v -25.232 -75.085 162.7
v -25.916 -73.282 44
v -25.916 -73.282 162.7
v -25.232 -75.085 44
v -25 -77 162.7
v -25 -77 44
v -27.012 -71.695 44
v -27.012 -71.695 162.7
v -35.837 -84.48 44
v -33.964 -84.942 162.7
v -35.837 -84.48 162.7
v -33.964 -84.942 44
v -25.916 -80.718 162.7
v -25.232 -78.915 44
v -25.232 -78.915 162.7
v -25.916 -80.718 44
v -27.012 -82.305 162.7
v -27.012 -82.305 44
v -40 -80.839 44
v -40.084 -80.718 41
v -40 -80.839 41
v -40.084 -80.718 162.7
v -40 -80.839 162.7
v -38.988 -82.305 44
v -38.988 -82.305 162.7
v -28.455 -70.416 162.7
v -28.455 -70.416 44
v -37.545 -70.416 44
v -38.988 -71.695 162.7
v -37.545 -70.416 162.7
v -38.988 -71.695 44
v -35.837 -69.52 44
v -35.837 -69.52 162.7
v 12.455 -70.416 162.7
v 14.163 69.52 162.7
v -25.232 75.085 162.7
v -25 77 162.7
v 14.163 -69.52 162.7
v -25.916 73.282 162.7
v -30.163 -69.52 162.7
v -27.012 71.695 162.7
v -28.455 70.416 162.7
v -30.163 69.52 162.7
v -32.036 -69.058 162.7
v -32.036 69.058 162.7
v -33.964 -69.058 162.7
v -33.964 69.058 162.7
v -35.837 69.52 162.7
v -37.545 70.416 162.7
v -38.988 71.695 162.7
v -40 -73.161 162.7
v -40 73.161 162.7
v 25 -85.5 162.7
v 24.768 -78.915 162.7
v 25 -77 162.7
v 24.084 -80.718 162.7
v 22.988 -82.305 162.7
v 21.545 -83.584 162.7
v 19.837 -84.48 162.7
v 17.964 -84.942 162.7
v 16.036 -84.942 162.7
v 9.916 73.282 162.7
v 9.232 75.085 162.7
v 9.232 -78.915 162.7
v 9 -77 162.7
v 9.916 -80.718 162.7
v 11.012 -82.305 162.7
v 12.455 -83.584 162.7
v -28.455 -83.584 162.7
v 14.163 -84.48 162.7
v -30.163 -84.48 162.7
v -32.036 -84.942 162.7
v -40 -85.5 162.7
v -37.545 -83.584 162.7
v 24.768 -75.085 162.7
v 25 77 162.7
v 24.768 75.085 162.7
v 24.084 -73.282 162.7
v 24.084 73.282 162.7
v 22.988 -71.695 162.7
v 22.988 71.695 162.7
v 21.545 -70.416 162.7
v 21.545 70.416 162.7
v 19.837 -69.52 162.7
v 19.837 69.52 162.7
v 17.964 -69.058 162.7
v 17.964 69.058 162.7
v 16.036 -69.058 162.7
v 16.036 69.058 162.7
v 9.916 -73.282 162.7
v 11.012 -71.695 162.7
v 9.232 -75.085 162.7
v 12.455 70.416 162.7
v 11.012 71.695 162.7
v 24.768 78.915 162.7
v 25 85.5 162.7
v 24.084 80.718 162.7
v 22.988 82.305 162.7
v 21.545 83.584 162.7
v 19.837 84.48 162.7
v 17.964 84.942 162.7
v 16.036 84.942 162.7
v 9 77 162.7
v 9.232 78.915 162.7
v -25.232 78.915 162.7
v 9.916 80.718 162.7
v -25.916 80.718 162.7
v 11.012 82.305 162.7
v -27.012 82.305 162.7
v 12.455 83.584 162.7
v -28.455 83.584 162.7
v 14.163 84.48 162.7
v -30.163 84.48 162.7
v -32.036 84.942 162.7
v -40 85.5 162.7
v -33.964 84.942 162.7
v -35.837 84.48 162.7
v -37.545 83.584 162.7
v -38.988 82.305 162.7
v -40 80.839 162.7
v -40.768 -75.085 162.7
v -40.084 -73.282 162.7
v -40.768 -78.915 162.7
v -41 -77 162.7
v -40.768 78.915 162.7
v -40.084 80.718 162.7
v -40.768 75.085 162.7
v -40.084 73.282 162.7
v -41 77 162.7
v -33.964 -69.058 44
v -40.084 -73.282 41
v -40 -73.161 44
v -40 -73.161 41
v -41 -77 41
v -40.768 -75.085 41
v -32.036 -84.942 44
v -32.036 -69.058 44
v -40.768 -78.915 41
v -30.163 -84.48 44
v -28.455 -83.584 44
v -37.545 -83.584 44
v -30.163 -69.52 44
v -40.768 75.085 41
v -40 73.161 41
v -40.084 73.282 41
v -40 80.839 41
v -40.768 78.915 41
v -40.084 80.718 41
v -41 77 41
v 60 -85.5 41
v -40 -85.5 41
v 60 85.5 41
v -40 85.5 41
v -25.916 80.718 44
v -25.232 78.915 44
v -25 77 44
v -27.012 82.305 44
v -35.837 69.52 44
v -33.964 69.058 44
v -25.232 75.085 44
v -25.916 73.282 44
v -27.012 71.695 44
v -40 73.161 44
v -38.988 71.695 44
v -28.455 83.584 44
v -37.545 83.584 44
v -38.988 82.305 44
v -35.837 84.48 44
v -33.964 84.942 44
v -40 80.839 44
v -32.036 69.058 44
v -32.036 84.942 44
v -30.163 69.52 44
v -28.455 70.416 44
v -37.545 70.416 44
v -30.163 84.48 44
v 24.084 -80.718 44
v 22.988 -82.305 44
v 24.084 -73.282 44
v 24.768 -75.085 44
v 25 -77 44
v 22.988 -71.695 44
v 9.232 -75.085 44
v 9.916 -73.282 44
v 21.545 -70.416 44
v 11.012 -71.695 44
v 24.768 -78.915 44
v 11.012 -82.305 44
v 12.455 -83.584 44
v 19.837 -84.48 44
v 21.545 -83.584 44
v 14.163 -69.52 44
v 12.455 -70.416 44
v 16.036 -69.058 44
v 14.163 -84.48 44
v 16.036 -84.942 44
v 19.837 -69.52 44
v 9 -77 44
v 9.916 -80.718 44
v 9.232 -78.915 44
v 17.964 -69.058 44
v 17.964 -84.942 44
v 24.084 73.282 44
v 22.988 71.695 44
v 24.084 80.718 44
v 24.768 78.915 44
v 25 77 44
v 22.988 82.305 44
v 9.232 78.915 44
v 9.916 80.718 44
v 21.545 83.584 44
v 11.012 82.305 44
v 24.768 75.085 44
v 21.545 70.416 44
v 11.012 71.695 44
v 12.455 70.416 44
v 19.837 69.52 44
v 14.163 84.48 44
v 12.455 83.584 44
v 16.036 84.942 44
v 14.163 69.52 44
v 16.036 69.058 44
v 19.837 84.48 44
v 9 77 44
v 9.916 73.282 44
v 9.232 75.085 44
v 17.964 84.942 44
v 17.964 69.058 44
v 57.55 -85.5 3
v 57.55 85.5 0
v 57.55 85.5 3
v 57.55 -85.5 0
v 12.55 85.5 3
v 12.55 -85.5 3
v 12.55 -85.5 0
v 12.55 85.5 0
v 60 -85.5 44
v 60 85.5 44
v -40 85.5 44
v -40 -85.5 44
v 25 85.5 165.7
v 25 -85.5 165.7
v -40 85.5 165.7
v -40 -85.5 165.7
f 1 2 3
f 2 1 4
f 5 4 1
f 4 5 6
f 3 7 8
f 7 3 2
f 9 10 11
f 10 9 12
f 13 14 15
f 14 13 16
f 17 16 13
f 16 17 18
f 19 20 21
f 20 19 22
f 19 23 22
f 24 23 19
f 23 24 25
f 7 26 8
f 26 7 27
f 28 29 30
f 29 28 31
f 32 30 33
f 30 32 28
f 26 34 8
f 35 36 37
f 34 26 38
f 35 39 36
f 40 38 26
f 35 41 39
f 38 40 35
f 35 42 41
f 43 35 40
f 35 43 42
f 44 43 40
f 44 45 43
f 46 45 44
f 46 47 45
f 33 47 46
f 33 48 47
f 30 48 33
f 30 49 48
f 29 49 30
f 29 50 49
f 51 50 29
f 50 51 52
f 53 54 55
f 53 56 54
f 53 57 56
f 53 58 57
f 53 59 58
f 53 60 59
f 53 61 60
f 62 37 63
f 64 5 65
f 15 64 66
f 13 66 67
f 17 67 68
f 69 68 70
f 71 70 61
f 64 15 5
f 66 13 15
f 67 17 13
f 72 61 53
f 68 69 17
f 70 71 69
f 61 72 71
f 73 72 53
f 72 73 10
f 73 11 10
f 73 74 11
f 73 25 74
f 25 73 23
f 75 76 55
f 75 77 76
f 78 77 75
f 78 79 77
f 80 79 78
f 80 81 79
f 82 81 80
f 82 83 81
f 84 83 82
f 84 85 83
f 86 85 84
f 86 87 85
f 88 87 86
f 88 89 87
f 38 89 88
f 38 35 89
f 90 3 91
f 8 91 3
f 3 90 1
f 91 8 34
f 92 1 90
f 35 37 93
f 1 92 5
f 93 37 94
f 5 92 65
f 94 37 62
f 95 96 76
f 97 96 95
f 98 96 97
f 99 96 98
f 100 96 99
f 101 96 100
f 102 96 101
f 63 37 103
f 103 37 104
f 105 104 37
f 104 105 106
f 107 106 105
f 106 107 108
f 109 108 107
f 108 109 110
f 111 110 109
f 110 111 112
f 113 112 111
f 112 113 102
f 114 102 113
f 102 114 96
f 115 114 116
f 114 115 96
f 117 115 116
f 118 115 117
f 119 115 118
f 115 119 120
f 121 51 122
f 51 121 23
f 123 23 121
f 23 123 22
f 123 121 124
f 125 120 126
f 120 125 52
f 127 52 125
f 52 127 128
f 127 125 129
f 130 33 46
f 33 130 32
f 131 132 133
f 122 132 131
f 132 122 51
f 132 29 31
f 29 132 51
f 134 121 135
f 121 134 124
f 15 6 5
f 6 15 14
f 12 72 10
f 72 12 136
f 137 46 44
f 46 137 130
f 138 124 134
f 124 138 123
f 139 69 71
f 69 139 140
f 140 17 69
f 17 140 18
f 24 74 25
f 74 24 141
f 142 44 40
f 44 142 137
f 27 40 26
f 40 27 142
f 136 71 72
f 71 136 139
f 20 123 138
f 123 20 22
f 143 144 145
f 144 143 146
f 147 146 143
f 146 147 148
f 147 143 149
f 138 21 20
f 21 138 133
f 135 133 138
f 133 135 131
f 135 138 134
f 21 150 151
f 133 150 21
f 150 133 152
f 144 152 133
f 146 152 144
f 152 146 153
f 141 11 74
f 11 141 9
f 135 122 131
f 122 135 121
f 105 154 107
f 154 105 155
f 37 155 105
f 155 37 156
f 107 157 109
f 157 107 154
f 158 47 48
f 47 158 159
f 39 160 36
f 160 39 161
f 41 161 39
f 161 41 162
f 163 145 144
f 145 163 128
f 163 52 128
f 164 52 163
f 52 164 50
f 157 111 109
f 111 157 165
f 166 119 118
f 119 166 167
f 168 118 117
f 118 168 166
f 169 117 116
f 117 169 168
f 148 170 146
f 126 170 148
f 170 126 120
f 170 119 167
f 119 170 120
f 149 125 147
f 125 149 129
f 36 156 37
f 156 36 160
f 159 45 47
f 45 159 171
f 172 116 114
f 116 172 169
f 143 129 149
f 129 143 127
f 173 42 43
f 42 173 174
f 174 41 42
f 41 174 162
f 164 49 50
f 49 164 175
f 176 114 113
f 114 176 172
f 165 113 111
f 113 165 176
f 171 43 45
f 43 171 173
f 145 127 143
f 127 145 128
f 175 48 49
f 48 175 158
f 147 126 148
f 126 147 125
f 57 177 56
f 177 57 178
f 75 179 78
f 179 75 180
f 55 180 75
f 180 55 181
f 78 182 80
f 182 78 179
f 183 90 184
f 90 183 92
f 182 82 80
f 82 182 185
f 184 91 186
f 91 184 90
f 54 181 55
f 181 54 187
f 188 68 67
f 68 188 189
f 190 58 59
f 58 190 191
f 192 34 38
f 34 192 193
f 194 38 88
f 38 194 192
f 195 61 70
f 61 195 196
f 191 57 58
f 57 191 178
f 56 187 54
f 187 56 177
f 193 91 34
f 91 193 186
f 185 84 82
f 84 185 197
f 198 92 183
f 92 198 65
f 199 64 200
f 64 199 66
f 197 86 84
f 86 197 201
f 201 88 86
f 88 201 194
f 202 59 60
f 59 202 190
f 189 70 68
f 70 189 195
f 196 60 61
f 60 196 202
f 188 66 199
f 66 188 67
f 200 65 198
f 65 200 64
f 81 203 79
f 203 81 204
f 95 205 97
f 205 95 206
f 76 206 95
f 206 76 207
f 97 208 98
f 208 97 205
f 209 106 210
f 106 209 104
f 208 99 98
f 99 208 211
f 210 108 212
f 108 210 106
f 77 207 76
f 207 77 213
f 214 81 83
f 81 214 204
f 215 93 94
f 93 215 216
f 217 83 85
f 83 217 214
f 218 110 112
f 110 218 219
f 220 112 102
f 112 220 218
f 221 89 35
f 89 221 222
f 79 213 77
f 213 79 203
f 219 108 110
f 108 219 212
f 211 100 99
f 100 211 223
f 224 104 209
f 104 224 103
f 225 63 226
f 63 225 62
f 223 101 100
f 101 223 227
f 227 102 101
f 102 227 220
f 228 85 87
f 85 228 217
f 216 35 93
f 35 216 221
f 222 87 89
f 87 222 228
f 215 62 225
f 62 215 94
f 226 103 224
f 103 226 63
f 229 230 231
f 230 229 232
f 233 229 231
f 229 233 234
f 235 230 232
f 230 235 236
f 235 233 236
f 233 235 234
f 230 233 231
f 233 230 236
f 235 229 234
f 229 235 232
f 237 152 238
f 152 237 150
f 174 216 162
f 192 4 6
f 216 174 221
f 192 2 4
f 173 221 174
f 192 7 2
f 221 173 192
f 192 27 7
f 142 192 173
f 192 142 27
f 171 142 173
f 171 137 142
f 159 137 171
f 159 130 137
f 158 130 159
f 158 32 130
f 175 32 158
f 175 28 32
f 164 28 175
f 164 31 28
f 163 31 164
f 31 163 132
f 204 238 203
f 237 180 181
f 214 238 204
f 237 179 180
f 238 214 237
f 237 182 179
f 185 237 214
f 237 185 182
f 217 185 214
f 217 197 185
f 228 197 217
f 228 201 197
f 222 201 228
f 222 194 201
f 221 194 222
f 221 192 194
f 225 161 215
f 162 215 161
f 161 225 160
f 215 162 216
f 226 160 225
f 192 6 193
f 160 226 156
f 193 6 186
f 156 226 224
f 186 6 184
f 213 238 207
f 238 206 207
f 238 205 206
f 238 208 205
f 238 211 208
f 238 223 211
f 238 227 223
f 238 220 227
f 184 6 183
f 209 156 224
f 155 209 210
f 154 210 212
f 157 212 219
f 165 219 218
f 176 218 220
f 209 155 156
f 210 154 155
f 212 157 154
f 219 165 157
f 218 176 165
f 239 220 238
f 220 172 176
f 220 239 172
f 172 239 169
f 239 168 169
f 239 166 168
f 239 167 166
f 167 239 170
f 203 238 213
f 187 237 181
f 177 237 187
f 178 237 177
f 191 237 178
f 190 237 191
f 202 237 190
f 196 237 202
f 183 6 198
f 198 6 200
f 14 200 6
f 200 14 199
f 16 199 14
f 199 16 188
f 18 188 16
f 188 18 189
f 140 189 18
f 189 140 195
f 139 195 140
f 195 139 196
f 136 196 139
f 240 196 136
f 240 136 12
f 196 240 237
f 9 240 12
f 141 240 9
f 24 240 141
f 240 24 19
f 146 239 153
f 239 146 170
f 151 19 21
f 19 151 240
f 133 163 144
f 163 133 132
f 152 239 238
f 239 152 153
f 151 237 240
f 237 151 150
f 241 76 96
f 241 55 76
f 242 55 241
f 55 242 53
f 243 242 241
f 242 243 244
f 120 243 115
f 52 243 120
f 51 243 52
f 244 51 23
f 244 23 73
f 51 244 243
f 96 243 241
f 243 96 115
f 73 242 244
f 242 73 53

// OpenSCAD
// file: ../models/mx64-values.scad
MX64Width = 40.2;
MX64Height = 61.1;
MX64Depth = 41;
MX64ShaftOffset = 18;
// file: ../models/mx28-values.scad
MX28Width = 35.6;
MX28Height = 50.6;
MX28Depth = 35.5;
MX28ShaftOffset = 12.5;
// main file
Collisions = false;
include<../models/mx28-values.scad>;
include<../models/mx64-values.scad>;

//:Part
module body_block(width=130, height=180, depth=80)
{
    plateWidth=width+41;
    p1 = MX64Depth;
    p2 = height+MX64Depth/2-MX28ShaftOffset-MX28Height/2;
    
    translate([MX64Height/2-MX64ShaftOffset,-plateWidth/2,0]) {
        cube([45,plateWidth,3]);
    }
    
    translate([-40,-plateWidth/2,p1]) {
        cube([100,plateWidth,3]);
    }
    
    translate([-40,-plateWidth/2,p2]) {
        cube([65,plateWidth,3]);
    }
    
    dX = 25;
    dY = width/2+12;
    translate([-8,0,0])
    for (x=[-dX,dX]) 
        for (y=[-dY,dY])
    translate([x,y,MX64Depth]) {
        cylinder(r=8, h=p2-p1);
    }
}

body_block();
